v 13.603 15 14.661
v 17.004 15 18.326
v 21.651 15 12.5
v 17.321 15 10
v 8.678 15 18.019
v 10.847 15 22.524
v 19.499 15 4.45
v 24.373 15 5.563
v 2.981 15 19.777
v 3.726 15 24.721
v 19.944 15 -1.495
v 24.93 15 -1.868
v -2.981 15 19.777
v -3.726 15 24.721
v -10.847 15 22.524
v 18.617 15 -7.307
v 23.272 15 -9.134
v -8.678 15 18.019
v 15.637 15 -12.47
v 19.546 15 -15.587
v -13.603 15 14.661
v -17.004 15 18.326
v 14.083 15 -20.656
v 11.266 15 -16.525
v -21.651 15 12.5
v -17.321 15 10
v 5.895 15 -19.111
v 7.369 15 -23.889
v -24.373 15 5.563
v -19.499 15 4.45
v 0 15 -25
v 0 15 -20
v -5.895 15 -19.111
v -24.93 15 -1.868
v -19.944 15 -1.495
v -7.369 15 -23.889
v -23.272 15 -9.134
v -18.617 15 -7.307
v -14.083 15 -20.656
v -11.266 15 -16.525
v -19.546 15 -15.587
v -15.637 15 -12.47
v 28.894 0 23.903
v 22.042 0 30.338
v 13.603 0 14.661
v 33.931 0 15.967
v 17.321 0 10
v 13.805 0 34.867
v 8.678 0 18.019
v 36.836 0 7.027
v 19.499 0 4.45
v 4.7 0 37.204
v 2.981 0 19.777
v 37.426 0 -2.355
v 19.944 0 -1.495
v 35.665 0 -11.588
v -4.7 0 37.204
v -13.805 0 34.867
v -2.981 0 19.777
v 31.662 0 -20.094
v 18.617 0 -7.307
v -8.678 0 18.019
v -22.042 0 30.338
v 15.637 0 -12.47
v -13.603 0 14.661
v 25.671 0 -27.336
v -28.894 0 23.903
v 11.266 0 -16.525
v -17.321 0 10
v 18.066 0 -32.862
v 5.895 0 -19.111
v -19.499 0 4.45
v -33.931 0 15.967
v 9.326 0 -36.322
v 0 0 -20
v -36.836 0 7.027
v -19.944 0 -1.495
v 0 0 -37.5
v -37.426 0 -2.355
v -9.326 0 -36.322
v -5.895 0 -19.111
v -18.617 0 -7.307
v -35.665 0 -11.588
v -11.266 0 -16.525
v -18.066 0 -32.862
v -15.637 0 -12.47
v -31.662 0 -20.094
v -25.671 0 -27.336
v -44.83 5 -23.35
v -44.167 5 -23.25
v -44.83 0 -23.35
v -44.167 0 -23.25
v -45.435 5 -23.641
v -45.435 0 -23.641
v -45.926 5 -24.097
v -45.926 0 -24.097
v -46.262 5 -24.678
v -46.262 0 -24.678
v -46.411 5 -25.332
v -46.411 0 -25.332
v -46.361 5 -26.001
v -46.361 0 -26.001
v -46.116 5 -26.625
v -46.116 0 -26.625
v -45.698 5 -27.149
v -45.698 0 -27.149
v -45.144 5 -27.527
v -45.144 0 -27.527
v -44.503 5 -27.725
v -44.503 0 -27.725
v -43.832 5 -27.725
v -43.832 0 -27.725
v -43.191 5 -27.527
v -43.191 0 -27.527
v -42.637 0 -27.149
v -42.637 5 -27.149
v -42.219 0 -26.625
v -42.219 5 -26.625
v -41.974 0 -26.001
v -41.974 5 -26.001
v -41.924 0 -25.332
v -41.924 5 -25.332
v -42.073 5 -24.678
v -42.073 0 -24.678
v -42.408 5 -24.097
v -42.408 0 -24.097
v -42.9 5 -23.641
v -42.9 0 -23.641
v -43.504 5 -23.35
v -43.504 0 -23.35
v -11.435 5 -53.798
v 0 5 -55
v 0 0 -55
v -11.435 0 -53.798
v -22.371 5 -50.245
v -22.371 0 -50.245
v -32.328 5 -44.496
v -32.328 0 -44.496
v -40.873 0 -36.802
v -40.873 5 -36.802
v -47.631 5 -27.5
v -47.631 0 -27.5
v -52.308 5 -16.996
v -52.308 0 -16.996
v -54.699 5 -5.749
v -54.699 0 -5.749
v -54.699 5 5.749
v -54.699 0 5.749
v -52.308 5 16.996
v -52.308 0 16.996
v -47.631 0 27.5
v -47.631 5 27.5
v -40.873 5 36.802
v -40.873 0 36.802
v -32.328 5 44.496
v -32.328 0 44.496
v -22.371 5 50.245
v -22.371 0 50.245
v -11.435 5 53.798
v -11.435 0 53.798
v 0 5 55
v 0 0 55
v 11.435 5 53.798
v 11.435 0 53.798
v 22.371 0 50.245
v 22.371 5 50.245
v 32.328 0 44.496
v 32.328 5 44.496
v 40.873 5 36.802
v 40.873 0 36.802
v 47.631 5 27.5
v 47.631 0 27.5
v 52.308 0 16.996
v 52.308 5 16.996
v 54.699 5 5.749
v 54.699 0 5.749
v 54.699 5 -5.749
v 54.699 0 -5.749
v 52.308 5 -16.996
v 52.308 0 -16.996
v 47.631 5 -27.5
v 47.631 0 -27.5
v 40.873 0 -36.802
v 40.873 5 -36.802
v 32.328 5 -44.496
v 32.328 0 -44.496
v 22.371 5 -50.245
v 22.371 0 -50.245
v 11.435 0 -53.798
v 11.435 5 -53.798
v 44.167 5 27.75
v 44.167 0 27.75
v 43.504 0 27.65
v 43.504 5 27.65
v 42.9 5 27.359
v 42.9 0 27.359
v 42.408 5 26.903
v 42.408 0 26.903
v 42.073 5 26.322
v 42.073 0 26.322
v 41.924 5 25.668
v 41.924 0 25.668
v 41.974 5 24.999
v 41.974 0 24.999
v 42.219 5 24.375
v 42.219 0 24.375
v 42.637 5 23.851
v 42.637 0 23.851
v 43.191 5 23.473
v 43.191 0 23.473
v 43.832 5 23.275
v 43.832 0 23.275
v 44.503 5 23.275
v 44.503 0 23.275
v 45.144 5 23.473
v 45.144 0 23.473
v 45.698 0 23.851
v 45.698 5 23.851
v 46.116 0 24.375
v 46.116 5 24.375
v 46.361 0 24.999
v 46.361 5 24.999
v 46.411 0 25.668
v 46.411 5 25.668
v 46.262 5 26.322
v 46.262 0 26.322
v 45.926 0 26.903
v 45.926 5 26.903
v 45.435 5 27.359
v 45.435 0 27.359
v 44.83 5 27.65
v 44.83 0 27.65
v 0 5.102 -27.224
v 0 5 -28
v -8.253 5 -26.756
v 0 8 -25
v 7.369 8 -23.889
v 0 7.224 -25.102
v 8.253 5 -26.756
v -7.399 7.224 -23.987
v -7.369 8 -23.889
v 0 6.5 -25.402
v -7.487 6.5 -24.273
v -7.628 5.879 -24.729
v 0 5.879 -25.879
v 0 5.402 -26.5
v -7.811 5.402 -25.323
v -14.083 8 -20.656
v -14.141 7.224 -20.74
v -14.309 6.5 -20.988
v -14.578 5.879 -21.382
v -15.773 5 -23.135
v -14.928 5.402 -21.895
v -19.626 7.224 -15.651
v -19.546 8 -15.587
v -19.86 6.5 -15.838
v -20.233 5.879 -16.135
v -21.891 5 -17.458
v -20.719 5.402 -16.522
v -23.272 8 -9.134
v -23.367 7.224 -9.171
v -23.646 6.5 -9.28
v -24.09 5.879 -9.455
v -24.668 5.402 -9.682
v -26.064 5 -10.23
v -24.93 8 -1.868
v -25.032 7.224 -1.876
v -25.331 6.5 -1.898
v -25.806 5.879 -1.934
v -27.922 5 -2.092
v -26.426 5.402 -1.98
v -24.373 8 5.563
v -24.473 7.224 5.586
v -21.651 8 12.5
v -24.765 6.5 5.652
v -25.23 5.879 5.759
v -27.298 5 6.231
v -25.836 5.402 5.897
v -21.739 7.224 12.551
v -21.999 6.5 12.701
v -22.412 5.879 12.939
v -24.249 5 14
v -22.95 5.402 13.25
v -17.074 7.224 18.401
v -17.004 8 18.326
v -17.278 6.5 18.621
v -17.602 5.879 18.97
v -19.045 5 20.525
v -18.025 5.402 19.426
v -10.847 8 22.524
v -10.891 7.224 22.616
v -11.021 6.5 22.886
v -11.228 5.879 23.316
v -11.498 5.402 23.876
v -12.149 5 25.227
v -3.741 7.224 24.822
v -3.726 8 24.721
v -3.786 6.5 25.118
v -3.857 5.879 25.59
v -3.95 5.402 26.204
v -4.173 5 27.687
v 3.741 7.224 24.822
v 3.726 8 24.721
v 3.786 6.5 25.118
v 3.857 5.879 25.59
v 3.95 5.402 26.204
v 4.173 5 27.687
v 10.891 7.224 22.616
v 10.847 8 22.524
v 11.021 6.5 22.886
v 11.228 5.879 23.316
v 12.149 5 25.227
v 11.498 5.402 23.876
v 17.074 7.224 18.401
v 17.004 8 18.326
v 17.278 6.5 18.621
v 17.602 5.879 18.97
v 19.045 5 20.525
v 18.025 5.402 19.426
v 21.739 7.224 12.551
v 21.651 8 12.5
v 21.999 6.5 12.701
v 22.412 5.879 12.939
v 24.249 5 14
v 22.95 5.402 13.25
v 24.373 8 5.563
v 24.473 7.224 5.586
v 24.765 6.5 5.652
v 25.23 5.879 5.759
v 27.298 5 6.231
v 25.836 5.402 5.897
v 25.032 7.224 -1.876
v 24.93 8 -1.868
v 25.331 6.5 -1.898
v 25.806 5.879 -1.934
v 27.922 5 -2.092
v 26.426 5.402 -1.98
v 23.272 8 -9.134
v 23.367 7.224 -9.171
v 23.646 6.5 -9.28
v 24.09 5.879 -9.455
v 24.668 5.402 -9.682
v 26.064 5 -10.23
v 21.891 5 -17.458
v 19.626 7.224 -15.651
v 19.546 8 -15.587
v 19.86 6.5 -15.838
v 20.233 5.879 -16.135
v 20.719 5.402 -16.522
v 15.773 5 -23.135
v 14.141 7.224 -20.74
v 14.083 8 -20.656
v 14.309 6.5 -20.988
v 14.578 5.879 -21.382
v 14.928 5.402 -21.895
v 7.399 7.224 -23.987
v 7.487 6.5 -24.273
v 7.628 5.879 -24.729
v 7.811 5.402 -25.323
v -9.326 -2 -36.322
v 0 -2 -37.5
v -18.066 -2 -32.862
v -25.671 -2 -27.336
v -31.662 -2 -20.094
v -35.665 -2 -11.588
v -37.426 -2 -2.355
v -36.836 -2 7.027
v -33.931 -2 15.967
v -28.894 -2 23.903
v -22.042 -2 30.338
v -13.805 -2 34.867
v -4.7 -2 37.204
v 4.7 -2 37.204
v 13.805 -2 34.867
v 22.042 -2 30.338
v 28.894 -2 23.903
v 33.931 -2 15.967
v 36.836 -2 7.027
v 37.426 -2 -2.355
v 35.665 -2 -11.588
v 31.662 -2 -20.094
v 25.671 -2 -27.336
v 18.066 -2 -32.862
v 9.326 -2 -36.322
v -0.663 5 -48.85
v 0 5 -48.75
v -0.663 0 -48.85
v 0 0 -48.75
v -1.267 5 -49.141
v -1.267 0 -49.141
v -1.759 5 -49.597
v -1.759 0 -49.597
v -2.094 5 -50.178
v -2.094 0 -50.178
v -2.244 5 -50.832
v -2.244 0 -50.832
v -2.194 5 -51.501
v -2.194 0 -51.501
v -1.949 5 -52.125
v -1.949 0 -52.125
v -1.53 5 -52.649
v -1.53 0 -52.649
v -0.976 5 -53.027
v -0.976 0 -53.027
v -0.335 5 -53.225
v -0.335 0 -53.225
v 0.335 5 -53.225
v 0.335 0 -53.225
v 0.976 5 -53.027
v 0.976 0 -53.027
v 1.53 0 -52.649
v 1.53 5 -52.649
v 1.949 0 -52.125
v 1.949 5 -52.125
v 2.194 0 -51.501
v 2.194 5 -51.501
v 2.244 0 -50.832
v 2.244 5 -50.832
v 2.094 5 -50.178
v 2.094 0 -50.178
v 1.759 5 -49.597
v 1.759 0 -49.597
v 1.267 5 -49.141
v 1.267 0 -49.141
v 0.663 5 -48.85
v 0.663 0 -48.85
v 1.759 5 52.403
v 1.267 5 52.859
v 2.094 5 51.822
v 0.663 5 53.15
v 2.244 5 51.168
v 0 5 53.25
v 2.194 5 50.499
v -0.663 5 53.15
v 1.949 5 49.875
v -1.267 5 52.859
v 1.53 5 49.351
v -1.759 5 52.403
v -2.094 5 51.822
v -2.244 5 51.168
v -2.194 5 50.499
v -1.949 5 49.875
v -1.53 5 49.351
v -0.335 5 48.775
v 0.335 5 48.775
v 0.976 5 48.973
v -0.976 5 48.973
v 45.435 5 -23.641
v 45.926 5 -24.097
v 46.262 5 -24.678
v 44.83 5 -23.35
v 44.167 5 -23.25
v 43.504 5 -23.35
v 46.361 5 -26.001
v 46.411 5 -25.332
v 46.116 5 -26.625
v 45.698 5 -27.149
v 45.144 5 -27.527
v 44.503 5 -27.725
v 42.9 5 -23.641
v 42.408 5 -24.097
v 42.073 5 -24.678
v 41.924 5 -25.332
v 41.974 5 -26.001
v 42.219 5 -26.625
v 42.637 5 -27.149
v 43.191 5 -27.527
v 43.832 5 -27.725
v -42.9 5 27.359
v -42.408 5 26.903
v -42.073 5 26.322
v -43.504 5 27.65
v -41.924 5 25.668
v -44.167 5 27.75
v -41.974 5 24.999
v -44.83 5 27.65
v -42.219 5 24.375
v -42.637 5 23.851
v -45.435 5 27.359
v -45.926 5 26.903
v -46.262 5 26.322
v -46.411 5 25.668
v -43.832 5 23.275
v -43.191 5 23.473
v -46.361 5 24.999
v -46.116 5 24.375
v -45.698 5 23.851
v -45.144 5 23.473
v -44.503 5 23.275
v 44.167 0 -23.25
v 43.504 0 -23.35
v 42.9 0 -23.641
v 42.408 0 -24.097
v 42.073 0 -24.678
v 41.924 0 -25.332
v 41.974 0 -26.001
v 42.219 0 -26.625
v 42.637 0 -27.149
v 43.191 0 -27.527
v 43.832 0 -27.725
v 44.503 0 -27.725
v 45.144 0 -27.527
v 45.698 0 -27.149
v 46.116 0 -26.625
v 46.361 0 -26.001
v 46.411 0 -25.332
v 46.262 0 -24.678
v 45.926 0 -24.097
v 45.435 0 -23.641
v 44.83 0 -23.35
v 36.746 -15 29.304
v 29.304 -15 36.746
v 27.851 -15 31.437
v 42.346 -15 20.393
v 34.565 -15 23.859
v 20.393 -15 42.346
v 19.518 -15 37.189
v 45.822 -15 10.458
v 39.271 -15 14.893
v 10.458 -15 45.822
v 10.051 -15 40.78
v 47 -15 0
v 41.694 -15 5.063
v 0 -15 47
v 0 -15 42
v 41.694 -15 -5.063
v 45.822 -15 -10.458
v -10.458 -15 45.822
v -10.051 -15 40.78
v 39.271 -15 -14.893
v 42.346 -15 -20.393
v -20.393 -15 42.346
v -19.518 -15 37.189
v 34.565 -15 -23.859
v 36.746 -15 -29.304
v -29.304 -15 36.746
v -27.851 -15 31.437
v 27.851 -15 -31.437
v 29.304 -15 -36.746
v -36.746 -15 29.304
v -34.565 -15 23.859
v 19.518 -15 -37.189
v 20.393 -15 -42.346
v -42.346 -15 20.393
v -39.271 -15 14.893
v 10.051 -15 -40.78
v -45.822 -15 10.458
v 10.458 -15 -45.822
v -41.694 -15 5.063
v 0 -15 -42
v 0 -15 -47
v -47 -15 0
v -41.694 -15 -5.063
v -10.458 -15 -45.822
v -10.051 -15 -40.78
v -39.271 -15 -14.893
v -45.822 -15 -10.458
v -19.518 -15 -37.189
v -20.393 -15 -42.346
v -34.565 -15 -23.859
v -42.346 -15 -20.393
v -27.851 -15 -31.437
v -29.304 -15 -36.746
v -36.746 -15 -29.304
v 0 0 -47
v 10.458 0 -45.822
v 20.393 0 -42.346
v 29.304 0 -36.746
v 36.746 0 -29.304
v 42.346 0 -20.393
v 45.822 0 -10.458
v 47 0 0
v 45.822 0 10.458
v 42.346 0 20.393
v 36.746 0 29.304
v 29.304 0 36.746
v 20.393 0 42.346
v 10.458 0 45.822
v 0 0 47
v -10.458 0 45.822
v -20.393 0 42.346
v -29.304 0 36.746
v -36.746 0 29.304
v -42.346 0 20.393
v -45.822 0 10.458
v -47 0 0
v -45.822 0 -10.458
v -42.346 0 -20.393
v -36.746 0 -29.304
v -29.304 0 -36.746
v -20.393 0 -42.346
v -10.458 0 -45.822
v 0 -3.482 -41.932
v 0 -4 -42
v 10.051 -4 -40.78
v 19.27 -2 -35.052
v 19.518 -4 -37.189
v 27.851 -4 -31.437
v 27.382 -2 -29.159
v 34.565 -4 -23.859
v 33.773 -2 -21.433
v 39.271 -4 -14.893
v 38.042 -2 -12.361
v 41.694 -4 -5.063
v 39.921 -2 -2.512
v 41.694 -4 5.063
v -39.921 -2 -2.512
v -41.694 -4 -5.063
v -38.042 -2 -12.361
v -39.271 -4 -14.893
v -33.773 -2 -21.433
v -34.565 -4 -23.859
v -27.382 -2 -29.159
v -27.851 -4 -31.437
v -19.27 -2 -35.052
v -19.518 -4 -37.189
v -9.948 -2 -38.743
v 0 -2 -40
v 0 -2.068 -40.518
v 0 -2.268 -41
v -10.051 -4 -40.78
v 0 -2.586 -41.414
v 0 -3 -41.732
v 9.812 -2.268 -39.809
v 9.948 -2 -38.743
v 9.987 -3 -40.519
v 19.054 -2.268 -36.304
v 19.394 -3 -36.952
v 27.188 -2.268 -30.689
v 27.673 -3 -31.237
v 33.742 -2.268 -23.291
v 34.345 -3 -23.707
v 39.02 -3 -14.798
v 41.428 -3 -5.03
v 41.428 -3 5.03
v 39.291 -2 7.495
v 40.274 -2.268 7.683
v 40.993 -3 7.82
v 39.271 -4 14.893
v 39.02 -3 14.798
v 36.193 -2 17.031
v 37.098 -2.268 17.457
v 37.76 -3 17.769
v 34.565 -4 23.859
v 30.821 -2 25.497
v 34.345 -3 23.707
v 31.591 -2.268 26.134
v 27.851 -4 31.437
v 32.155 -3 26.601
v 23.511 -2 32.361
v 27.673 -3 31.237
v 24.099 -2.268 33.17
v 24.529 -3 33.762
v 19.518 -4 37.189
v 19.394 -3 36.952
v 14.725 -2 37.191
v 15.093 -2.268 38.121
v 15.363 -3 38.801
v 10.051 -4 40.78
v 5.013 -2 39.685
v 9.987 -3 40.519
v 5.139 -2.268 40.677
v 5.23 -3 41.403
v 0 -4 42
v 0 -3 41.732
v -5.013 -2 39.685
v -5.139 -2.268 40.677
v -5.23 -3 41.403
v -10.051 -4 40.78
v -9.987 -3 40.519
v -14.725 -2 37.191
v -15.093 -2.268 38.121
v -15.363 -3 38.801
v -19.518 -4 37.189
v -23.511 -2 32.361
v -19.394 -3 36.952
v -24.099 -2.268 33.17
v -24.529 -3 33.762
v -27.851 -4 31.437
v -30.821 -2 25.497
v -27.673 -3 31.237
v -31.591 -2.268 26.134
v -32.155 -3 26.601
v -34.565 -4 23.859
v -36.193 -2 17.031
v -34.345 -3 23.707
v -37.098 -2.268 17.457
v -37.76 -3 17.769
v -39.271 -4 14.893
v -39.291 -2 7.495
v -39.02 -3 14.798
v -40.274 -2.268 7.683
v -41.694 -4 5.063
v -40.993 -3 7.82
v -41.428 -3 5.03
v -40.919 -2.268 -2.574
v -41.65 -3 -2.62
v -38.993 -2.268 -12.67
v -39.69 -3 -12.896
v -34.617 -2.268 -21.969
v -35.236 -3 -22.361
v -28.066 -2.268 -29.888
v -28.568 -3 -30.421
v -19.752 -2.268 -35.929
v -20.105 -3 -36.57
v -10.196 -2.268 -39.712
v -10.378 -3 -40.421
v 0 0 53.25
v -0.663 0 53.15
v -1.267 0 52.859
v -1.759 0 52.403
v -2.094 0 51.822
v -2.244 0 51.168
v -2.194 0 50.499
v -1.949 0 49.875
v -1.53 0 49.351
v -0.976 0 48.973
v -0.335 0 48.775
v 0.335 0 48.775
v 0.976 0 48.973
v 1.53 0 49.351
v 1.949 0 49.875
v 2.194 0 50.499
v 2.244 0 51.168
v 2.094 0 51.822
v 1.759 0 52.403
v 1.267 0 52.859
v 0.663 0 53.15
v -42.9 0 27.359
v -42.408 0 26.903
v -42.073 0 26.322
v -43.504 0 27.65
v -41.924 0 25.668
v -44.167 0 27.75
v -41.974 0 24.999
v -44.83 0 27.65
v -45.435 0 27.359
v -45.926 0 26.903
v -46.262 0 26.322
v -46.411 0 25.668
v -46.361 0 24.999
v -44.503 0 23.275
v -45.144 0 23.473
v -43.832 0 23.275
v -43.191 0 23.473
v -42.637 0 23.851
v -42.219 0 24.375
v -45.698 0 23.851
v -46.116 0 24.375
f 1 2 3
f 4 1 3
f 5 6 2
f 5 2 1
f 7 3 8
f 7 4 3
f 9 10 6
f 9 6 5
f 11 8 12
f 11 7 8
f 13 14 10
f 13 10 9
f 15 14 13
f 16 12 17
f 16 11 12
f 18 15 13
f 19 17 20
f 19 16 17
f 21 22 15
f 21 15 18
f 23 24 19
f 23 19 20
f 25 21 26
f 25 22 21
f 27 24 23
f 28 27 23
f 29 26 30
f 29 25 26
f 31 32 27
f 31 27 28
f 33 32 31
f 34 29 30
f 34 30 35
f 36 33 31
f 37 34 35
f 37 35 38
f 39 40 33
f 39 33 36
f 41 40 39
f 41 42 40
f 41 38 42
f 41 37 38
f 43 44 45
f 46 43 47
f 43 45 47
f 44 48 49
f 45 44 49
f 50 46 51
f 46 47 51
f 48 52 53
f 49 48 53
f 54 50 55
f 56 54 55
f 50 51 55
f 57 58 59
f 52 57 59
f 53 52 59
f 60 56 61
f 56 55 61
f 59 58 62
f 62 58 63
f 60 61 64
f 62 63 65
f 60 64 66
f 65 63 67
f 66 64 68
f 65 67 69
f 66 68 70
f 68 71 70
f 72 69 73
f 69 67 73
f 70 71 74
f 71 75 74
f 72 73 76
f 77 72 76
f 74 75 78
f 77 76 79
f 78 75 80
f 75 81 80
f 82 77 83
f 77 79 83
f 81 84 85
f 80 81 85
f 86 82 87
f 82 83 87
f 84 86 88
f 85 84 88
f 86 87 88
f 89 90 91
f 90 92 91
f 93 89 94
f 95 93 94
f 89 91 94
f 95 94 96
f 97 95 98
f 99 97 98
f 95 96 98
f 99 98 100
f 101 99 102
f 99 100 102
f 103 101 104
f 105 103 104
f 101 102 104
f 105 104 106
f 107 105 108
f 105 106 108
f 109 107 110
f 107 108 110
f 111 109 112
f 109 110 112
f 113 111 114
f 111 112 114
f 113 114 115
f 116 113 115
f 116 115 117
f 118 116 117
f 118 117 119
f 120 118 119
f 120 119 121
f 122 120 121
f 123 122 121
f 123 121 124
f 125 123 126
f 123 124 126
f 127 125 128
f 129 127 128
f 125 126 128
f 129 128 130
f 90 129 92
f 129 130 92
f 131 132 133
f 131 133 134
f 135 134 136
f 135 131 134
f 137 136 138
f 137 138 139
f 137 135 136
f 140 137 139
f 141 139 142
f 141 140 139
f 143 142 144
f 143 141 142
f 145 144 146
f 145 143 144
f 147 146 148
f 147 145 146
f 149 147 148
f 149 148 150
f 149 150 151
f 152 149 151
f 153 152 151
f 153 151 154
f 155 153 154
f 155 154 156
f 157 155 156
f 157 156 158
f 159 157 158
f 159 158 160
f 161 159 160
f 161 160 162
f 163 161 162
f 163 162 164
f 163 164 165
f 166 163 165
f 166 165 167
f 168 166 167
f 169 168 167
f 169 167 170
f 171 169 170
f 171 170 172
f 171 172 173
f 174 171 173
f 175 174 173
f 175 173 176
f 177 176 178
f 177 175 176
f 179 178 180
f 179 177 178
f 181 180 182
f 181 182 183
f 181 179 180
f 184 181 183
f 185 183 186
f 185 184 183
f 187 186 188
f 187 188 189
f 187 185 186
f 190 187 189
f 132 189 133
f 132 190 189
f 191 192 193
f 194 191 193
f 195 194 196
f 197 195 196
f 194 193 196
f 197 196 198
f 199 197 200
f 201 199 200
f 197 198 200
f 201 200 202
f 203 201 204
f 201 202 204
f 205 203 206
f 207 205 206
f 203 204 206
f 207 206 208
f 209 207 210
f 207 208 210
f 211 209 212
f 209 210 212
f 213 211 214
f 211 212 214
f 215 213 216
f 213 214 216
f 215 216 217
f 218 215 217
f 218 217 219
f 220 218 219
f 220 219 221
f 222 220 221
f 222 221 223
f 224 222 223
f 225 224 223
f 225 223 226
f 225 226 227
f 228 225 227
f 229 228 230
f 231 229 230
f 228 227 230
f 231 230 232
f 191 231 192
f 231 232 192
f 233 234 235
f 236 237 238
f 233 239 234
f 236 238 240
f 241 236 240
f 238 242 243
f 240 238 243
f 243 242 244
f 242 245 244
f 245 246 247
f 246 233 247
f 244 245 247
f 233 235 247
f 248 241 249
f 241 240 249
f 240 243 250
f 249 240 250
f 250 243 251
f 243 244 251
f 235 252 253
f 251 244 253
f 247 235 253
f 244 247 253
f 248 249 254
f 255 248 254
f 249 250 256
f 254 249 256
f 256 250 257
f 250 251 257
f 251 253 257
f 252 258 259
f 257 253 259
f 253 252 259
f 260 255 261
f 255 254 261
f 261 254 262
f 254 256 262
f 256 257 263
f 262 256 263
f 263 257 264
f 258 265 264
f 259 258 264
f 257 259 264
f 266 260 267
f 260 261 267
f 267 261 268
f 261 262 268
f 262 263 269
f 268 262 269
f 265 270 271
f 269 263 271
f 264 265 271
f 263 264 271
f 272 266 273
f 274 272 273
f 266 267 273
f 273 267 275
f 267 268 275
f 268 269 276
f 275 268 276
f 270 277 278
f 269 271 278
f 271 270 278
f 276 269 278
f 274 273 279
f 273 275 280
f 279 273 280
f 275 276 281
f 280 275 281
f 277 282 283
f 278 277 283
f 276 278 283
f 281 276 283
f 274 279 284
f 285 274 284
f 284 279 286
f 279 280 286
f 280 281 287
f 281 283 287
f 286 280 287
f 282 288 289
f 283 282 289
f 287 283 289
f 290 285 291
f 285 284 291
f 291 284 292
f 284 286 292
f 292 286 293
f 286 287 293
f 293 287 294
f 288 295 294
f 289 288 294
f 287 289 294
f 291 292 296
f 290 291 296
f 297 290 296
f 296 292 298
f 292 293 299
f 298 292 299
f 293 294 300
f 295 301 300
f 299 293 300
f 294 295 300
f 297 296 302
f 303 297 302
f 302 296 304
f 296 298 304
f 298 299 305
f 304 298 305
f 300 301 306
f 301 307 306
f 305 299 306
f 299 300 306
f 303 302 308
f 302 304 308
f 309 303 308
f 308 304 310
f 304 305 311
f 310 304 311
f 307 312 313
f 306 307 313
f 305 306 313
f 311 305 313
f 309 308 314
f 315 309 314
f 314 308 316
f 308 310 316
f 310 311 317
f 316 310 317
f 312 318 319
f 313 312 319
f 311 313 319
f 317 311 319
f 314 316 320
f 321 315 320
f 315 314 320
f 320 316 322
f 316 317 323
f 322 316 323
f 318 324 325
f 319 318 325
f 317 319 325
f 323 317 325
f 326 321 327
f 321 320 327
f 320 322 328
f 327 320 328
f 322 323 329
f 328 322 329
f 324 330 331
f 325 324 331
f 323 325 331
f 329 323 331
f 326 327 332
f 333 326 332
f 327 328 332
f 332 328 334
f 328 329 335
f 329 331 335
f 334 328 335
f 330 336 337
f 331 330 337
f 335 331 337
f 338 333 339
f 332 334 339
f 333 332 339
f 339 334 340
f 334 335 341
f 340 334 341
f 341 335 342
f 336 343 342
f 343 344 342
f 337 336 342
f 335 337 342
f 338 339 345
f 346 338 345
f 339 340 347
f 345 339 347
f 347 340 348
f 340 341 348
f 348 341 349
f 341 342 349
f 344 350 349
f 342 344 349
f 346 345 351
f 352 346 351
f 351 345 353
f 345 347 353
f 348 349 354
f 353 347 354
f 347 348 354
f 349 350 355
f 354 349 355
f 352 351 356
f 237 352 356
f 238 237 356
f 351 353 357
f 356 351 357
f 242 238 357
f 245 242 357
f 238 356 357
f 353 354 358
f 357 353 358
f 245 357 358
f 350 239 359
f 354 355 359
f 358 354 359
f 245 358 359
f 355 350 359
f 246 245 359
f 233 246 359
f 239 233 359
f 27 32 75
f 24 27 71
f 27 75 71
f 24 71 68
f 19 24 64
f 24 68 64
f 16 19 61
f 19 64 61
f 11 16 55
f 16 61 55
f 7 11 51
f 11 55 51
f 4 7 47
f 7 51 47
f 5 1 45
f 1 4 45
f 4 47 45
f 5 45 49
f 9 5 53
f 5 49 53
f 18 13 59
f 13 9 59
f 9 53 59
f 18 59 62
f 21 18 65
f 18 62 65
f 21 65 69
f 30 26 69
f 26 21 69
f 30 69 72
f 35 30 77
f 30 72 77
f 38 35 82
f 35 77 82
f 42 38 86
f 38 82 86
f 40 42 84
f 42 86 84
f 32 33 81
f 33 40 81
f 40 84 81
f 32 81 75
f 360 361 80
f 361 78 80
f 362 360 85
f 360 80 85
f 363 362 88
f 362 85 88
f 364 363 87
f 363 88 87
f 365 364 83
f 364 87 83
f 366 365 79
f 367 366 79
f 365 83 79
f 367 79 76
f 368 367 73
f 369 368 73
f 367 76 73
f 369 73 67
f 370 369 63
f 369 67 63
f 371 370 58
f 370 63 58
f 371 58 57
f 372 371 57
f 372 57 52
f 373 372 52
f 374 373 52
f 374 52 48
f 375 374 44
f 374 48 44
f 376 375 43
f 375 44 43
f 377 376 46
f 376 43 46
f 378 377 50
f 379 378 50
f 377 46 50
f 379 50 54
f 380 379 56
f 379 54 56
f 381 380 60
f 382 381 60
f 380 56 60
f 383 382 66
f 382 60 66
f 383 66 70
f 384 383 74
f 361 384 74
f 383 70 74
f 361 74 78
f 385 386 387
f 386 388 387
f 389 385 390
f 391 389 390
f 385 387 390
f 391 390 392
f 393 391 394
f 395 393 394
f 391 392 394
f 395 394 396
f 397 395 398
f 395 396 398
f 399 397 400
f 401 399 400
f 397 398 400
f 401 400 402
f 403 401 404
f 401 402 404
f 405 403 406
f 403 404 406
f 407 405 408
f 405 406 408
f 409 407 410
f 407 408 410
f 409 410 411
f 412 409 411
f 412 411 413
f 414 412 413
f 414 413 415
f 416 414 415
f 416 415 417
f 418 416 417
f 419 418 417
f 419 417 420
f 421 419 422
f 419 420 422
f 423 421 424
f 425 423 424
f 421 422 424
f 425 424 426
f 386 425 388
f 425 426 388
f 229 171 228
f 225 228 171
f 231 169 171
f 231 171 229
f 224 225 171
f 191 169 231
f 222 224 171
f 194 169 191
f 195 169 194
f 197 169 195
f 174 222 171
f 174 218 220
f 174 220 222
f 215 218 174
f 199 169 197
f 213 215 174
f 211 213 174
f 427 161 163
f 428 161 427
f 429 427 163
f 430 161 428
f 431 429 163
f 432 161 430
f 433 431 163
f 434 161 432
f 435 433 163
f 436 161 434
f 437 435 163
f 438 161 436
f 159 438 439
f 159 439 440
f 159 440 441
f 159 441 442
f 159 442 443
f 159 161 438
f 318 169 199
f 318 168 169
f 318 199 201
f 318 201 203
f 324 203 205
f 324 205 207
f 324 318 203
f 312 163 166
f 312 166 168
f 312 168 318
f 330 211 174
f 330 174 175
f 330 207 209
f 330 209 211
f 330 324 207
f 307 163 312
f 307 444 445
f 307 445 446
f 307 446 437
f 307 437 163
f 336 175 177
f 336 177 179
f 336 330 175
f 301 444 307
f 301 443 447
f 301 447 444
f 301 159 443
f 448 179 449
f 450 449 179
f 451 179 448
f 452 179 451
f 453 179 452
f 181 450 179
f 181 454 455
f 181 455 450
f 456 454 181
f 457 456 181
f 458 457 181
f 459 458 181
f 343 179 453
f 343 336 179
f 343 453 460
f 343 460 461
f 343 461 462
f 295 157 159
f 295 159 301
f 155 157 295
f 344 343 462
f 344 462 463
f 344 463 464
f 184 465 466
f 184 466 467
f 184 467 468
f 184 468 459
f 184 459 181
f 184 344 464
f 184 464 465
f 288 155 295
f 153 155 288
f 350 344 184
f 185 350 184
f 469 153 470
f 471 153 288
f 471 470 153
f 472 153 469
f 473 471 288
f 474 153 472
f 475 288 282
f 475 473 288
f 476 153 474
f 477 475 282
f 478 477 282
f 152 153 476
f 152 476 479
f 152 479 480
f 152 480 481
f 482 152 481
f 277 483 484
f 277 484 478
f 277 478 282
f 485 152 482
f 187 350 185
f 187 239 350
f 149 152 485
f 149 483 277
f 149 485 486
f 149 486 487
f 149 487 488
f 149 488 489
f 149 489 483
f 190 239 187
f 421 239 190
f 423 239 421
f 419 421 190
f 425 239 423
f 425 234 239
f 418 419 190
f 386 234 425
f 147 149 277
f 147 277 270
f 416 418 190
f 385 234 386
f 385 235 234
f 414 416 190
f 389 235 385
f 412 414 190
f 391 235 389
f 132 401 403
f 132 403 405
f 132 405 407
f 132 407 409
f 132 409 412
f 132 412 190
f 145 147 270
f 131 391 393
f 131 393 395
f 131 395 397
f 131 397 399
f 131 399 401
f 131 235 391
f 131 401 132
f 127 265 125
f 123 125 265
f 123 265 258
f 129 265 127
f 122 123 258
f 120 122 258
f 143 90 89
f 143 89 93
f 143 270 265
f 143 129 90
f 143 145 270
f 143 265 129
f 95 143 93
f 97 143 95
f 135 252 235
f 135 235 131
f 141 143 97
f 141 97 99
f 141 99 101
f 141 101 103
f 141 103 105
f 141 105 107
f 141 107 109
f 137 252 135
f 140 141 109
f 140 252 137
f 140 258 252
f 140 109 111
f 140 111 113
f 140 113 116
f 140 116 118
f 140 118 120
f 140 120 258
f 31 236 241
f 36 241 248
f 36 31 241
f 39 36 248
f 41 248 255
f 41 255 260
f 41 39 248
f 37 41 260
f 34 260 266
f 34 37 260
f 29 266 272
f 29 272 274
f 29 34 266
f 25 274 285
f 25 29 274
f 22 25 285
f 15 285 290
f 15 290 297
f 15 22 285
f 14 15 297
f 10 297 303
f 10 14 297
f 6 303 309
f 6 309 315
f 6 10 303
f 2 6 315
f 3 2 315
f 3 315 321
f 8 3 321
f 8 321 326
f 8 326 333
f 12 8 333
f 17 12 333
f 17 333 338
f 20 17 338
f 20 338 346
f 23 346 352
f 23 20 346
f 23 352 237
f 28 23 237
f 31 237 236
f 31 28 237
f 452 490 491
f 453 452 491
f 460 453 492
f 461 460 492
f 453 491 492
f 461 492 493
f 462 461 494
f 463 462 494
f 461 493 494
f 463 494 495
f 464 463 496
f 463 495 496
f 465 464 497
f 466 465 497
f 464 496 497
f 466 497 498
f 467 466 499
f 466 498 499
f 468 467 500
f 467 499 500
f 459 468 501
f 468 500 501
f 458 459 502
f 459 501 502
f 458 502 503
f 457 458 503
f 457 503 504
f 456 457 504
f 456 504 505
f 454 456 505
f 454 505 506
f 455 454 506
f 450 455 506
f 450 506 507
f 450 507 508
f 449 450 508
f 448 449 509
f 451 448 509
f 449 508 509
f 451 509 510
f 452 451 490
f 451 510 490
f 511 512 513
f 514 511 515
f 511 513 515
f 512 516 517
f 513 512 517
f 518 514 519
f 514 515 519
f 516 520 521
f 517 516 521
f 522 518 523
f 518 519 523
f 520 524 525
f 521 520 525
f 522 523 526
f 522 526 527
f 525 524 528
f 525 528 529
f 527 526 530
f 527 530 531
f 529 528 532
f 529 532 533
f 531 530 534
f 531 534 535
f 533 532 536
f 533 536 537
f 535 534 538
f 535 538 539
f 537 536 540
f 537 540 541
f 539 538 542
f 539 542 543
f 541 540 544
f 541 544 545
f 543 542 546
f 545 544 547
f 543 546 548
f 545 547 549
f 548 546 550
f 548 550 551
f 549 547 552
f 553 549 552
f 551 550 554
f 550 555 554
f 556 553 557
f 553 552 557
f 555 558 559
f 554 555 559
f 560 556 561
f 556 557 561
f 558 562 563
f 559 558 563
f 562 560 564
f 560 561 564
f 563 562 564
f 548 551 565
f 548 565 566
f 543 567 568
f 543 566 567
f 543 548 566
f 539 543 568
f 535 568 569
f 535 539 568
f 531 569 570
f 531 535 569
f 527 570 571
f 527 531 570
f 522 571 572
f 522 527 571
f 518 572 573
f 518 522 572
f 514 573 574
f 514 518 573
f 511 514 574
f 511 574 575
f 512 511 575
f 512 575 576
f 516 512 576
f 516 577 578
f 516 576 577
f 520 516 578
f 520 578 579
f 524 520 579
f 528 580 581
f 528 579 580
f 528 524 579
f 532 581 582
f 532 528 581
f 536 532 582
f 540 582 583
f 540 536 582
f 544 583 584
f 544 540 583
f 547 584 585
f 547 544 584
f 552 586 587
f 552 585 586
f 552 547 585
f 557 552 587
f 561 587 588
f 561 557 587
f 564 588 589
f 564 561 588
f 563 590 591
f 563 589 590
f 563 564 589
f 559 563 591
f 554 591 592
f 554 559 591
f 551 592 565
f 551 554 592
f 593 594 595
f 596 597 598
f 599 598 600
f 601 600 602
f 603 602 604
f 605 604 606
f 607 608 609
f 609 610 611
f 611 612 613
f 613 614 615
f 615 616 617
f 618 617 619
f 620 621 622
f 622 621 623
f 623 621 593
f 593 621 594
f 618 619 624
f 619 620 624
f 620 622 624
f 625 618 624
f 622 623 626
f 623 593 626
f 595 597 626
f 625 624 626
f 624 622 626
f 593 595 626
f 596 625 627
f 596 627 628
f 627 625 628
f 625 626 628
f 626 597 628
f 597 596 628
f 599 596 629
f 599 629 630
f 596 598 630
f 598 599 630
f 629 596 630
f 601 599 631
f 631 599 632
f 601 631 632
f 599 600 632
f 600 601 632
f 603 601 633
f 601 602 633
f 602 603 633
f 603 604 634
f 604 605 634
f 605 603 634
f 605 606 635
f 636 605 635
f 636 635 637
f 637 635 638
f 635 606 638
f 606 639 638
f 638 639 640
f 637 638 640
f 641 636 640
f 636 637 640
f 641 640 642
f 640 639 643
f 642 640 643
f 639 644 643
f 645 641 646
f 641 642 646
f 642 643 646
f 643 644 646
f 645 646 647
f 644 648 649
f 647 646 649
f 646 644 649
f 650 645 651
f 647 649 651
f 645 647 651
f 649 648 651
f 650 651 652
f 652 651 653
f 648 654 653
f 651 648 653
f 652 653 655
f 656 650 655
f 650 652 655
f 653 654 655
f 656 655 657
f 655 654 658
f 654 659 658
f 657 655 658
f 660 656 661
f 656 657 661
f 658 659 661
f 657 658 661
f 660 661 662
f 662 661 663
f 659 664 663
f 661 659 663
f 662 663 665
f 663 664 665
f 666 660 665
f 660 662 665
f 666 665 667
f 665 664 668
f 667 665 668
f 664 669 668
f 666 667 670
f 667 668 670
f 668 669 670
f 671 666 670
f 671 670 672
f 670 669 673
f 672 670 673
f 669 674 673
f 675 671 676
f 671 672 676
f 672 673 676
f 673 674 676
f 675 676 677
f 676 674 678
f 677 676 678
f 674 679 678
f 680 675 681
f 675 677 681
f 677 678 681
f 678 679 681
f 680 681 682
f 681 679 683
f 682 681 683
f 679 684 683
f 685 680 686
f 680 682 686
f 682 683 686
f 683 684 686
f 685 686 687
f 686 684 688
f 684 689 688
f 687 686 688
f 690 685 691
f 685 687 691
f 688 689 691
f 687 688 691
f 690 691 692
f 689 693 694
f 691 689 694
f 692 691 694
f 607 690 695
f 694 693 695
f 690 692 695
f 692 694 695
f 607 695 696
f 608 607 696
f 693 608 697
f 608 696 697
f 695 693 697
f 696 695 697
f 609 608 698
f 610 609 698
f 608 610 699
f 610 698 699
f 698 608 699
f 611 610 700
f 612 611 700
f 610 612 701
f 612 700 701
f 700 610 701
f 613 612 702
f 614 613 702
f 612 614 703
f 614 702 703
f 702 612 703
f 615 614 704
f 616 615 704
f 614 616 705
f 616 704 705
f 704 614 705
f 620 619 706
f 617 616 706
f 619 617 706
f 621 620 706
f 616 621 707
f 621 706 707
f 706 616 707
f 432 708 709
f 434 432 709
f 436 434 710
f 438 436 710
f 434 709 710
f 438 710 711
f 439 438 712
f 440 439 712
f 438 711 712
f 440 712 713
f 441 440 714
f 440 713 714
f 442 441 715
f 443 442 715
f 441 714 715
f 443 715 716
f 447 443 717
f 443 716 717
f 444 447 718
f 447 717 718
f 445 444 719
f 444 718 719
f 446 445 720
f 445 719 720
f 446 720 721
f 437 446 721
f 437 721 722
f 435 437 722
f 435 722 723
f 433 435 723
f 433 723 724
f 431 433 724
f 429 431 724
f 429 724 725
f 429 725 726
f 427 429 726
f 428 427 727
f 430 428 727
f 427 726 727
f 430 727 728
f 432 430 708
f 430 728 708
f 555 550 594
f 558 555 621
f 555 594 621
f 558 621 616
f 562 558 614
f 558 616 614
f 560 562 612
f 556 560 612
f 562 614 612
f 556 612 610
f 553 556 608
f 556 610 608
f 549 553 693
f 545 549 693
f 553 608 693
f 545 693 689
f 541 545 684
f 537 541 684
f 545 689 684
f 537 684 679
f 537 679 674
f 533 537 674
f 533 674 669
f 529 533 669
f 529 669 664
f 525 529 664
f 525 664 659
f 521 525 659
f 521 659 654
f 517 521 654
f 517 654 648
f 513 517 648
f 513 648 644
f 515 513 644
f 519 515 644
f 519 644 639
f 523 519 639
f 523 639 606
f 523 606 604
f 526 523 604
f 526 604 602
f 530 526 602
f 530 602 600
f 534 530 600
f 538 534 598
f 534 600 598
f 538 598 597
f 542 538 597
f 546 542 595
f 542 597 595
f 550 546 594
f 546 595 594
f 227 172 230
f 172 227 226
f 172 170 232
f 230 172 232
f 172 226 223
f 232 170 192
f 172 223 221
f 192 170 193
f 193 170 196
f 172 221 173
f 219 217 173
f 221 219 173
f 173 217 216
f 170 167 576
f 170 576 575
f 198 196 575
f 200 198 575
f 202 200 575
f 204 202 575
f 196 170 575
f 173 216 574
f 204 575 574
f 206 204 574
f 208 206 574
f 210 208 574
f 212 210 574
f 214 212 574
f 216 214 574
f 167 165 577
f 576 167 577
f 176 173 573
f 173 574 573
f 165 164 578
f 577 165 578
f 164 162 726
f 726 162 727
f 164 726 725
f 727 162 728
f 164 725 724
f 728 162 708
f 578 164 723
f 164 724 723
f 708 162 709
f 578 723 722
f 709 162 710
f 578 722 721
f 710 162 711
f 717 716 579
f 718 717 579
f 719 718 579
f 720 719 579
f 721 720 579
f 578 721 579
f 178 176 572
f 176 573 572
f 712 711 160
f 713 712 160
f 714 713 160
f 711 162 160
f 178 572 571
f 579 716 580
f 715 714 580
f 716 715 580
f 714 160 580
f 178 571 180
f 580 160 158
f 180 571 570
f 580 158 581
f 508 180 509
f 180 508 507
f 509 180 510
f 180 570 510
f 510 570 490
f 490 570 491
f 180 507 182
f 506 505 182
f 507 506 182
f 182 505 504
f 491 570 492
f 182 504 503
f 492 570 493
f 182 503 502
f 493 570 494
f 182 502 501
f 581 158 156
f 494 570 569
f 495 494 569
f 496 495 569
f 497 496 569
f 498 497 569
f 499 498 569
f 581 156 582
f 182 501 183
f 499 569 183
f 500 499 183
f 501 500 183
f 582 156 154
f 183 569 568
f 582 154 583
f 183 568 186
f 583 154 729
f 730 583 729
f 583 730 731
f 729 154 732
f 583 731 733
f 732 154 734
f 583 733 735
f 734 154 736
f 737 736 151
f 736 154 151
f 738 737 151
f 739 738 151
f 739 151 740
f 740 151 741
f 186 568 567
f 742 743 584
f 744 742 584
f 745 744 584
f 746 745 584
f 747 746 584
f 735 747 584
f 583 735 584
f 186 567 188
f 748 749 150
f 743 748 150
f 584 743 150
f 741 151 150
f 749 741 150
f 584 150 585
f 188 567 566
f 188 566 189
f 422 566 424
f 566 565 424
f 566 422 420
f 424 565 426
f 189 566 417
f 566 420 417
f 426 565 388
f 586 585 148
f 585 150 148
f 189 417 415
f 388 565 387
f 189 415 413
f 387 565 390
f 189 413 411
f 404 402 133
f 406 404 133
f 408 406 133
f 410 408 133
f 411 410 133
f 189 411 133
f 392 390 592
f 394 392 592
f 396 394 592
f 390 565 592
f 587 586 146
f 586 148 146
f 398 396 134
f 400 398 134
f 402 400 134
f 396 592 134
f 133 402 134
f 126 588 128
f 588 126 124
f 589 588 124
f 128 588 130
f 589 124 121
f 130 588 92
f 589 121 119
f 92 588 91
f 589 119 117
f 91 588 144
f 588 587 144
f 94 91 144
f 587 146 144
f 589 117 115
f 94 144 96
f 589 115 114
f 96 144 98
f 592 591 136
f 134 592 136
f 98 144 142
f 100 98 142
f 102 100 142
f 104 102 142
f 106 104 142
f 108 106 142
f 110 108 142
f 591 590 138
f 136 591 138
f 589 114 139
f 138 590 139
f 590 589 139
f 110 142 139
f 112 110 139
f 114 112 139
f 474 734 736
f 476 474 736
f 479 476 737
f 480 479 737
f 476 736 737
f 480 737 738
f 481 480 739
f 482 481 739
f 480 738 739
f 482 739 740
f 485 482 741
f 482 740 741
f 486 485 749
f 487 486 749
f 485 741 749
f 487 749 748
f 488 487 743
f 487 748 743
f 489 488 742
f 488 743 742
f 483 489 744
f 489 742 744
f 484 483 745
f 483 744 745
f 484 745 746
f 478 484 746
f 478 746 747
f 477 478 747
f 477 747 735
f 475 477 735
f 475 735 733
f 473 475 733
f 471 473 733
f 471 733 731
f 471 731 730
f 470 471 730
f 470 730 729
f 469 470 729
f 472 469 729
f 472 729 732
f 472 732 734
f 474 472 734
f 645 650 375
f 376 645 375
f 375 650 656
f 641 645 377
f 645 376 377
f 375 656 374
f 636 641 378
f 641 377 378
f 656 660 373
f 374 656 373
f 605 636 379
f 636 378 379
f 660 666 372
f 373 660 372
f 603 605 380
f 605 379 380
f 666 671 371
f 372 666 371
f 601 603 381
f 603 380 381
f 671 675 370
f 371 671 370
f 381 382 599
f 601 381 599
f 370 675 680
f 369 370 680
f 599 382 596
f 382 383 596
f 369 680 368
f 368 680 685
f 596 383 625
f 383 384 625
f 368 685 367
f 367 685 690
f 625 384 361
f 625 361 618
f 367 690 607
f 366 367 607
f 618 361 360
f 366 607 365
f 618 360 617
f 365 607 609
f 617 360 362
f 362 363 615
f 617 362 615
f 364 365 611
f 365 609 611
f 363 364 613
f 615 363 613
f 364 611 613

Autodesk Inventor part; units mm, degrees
ref_plane "XZ Plane" through (0, 0, 0) normal (0, 1, 0) x (-1, 0, 0)
ref_plane "XY Plane" through (0, 0, 0) normal (0, 0, 1) x (1, 0, 0)
sketch "Skizze1" plane through (0, 0, 0) normal (1, 0, 0) x (0, 1, 0)
  line L0 (15, -20) -> (5, -20)
  line L1 (5, -20) -> (5, -25)
  line L2 (5, -25) -> (15, -25)
  line L3 (15, -25) -> (15, -20)
  line L4 (5, -20) -> (0, -20)
  line L5 (0, -20) -> (0, -55)
  line L6 (0, -55) -> (5, -55)
  line L7 (5, -55) -> (5, -20)
  line L8 (0, -47) -> (-15, -47)
  line L9 (-15, -47) -> (-15, -42)
  line L10 (-15, -42) -> (0, -42)
  line L11 (0, -42) -> (0, -47)
  line L12 (0, -42) -> (-2, -42)
  line L13 (-2, -42) -> (-2, -37.5)
  line L14 (-2, -37.5) -> (0, -37.5)
  line L15 (0, -37.5) -> (0, -42)
  line L16 (-21, 0) -> (21, 0) projected
  line L17 (0, -66) -> (0, 11) projected
  point P0 (0, 0)
  point P1 (10, -25)
  point P2 (10, -20)
  point P3 (0, -44.5)
  point P4 (2.5, -55)
  point P5 (-7.5, -47)
  point P6 (0, -37.5)
  point P7 (-2, -42)
  point P8 (5, -25)
  dimension "d0" = 5
  dimension "d1" = 5
  dimension "d2" = 35
  dimension "d3" = 10
  dimension "d4" = 8
  dimension "d5" = 5
  dimension "d6" = 15
  dimension "d7" = 20
  dimension "d8" = 2
  dimension "d9" = 4.5
  dimension "d10" = 0
revolve "Umdrehung1" add sketch "Skizze1" angle 360 about axis through (0, -10, 0) along (0, 1, 0)
fillet "Rundung1" radius 3 1 edges at (0, 5, 25)
fillet "Rundung2" radius 2 1 edges at (0, -2, 42)
sketch "Skizze2" plane through (0, 5, 0) normal (0, 1, 0) x (1, 0, 0)
  line L0 (-77, 0) -> (77, 0) projected
  line L1 (0, 77) -> (0, -77) projected
  circle A0 centre (0, 0) radius 51
  circle A1 centre (0, 0) radius 55 projected
  point P0 (0, -51)
  point P1 (44.1673, -25.5)
  point P2 (44.1673, 25.5)
  point P3 (0, 51)
  point P4 (-44.1673, 25.5)
  point P5 (-44.1673, -25.5)
  dimension "d14" = 4
  dimension "d17" = 360
hole "Bohrung1" at (0, 5, 51) at (44.1673, 5, 25.5) at (44.1673, 5, -25.5) at (0, 5, -51) at (-44.1673, 5, -25.5) at (-44.1673, 5, 25.5) direction (0, -1, 0) diameter 4.5 depth 11.8 tip angle 118
properties part number "Deckel Stempel"
